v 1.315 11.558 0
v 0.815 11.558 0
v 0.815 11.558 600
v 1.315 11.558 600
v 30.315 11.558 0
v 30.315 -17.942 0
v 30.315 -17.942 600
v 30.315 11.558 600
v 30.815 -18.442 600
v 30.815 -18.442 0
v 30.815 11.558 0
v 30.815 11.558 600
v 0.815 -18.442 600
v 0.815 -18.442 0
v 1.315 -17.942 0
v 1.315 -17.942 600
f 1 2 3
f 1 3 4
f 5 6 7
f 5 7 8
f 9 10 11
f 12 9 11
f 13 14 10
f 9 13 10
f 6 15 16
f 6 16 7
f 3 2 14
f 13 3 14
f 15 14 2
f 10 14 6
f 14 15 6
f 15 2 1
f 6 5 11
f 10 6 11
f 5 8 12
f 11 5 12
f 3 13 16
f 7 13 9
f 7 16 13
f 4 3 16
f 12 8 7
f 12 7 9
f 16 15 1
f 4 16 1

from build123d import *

# Parameters (mm, degrees)
F0_W     = 0.5
F0_H     = 29.5
F0_W_2   = 29
F0_H_2   = 0.5
F1_DEPTH = 600


with BuildPart() as f1:
    # F0 (on Top) → F1 (new body)
    with BuildSketch(Plane.XY):
        with Locations((1.0650282837, -3.191780895)):
            Rectangle(F0_W, F0_H)
        with Locations((15.8150282837, -18.191780895)):
            Rectangle(F0_W_2, F0_H_2)
        with Locations((30.5650282837, -3.191780895)):
            Rectangle(F0_W, F0_H)
        with Locations((30.5650282837, -18.191780895)):
            Rectangle(F0_W, F0_H_2)
        with Locations((1.0650282837, -18.191780895)):
            Rectangle(F0_W, F0_H_2)
    extrude(amount=F1_DEPTH)


solid = f1.part
